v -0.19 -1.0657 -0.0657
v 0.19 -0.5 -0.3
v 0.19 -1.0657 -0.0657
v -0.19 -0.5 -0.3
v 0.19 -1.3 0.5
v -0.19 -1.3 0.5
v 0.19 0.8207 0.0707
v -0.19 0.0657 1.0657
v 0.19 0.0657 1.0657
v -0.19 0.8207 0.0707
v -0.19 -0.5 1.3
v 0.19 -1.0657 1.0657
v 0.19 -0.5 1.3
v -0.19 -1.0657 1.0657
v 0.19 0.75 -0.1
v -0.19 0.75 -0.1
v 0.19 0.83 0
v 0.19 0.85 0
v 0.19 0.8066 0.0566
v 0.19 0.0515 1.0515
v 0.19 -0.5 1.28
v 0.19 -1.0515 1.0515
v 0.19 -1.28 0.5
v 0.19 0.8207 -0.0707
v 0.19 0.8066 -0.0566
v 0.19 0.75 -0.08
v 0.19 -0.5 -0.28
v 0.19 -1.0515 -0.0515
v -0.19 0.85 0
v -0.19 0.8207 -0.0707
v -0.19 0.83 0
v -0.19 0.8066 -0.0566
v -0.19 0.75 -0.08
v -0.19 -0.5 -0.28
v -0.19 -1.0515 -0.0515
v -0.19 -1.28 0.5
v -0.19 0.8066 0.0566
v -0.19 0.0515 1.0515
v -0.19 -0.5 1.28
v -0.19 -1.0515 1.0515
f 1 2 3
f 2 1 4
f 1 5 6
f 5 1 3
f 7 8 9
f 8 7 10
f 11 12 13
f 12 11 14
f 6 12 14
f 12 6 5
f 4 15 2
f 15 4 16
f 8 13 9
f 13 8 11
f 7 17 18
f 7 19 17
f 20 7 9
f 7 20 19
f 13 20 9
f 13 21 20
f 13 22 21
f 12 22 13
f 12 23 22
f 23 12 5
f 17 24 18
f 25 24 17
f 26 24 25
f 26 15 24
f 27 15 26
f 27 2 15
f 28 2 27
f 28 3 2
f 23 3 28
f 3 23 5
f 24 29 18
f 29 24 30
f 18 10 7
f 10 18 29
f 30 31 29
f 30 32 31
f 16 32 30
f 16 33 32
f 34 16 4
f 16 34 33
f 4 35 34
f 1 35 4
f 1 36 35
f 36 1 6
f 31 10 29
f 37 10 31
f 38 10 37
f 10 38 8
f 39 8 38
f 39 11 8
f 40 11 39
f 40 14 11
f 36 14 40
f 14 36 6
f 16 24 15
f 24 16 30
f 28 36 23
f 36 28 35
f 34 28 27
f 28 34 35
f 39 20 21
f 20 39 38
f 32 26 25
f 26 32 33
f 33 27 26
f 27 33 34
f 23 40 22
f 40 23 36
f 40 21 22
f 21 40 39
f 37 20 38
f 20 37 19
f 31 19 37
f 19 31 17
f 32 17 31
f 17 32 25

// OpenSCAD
use <lib.scad>

hd=72;
ld=8;

module pipe() {
	translate([0,0,-2.5]) cyl(0.5, 0.5, 5);
}

module wheelHD($fn=hd) {
	rotate([0,90,0]) difference() {
		union() {
			difference() {
				cyl(0.8,0.8,0.5);
				cyl(0.7,0.7,0.6);
			}
			rotate([0,0,0]) translate([0.4,0,0]) box([0.75,0.1,0.2]);
			rotate([0,0,120]) translate([0.4,0,0]) box([0.75,0.1,0.2]);
			rotate([0,0,240]) translate([0.4,0,0]) box([0.75,0.1,0.2]);
			cyl(0.1,0.1,0.5,$fn=$fn/4);
		}
		difference() {
			cyl(0.9,0.9,0.4);
			cyl(0.775,0.775,0.5);
		}
	}
}

module wheelLD($fn=ld) {
	rotate([0,90,0]) difference() {
		union() {
			difference() {
				cyl(0.8,0.8,0.5);
				cyl(0.7,0.7,0.6);
			}
			rotate([0,0,0]) translate([0.4,0,0]) box([0.75,0.1,0.2]);
			rotate([0,0,120]) translate([0.4,0,0]) box([0.75,0.1,0.2]);
			rotate([0,0,240]) translate([0.4,0,0]) box([0.75,0.1,0.2]);
			cyl(0.1,0.1,0.5);
		}
		difference() {
			cyl(0.9,0.9,0.4);
			cyl(0.775,0.775,0.5);
		}
	}
}

module thingyHD($fn=hd) {
	union() {
		hull() {
			translate([0,0,0]) cyl(0.35,0.35,1);
			translate([0,0,-0.5]) sphere(0.35);
			translate([0,0,0.5]) sphere(0.35);
		}
		translate([0,0,0.5]) torus(0.025, 0.32);
		translate([0,0,-0.5]) torus(0.025, 0.32);
		translate([0,0,0.65]) cyl(0.1,0.1,0.5);
		translate([0,0,0.7]) cyl(0.08,0.08,0.5,$fn=6);
	}
}

module thingyLD($fn=ld) {
	union() {
		hull() {
			translate([0,0,0]) cyl(0.35,0.35,1);
			translate([0,0,-0.5]) sphere(0.35);
			translate([0,0,0.5]) sphere(0.35);
		}
		translate([0,0,0.65]) cyl(0.1,0.1,0.5);
	}
}

module motorHD($fn=hd) {
	union() {
		hull() {
			rotate([0,90,0]) cyl(0.3,0.3,0.6);
			translate([0.4,0,0]) rotate([0,90,0]) torus(0.01, 0.2);
		}
		translate([-0.3,0,0]) rotate([0,90,0]) hull() {
			torus(0.1,0.125);
			translate([0,0,0.1]) cyl(0.325,0.325,0.1);
		}
		for (i = [0:10:360])
			rotate([i,0,0]) box([0.64,0.01,0.64]);
	}
}

module motorLD($fn=ld) {
	union() {
		hull() {
			rotate([0,90,0]) cyl(0.325,0.326,0.6);
			translate([0.4,0,0]) rotate([0,90,0]) cyl(0.2, 0.2, 0.05);
			translate([-0.4,0,0]) rotate([0,90,0]) cyl(0.2, 0.2, 0.05);
		}
	}
}

module motorShaftHD($fn=hd/2) {
	union() {
		translate([0.25,0,0]) rotate([0,90,0]) cyl(0.05,0.05,1.3);
		translate([0.7,0,0]) rotate([0,90,0]) difference() {
			cyl(0.1,0.1,0.45);
			difference() {
				cyl(0.15,0.15,0.4);
				cyl(0.075,0.075,0.5);
			}
			translate([0,0,0.225]) union() {
				box([0.1,0.025,0.075]);
				rotate([0,0,90]) box([0.1,0.025,0.075]);
			}
		}
	}
}

module motorShaftLD($fn=ld) {
	union() {
		translate([0.25,0,0]) rotate([0,90,0]) cyl(0.05,0.05,1.3);
		translate([0.7,0,0]) rotate([0,90,0]) difference() {
			cyl(0.1,0.1,0.45);
			difference() {
				cyl(0.15,0.15,0.4);
				cyl(0.075,0.075,0.5);
			}
		}
	}
}

module beltHD($fn=hd) {
	difference() {
		hull() {
			translate([0,0.75,0]) rotate([0,90,0]) difference() {
				cyl(0.1,0.1,0.38);
				cyl(0.08,0.08,0.5);
			}
			translate([0,-0.5,0.5]) rotate([0,90,0]) difference() {
				cyl(0.8,0.8,0.38);
				cyl(0.08,0.08,0.5);
			}
		}
		scale([1.1,1,1]) hull() {
			translate([0,0.75,0]) rotate([0,90,0]) cyl(0.08,0.08,0.4);
			translate([0,-0.5,0.5]) rotate([0,90,0]) cyl(0.78,0.78,0.4);
		}
	}
}

module beltLD($fn=ld) {
	difference() {
		hull() {
			translate([0,0.75,0]) rotate([0,90,0]) difference() {
				cyl(0.1,0.1,0.38);
				cyl(0.08,0.08,0.5);
			}
			translate([0,-0.5,0.5]) rotate([0,90,0]) difference() {
				cyl(0.8,0.8,0.38);
				cyl(0.08,0.08,0.5);
			}
		}
		scale([1.1,1,1]) hull() {
			translate([0,0.75,0]) rotate([0,90,0]) cyl(0.08,0.08,0.4);
			translate([0,-0.5,0.5]) rotate([0,90,0]) cyl(0.78,0.78,0.4);
		}
	}
}

module pump() {
//	translate([0,0,1.5]) %box([3,3,3]);
//	translate([0,0,0.5]) rbox([3,3,1],0.01,$fn=8);
//	translate([0,0,0.5]) box([3,3,1]);
//	translate([-1,0.5,2]) thingy();
//	translate([-1,-0.5,2]) thingy();
//	translate([1,-0.5,2]) wheel();
//	translate([0.3,0.75,1.5]) motor();
//	translate([0.3,0.75,1.5]) motorShaft();
//	translate([1,0,1.5]) belt();
}


//pump($fn=hd);
beltLD();
